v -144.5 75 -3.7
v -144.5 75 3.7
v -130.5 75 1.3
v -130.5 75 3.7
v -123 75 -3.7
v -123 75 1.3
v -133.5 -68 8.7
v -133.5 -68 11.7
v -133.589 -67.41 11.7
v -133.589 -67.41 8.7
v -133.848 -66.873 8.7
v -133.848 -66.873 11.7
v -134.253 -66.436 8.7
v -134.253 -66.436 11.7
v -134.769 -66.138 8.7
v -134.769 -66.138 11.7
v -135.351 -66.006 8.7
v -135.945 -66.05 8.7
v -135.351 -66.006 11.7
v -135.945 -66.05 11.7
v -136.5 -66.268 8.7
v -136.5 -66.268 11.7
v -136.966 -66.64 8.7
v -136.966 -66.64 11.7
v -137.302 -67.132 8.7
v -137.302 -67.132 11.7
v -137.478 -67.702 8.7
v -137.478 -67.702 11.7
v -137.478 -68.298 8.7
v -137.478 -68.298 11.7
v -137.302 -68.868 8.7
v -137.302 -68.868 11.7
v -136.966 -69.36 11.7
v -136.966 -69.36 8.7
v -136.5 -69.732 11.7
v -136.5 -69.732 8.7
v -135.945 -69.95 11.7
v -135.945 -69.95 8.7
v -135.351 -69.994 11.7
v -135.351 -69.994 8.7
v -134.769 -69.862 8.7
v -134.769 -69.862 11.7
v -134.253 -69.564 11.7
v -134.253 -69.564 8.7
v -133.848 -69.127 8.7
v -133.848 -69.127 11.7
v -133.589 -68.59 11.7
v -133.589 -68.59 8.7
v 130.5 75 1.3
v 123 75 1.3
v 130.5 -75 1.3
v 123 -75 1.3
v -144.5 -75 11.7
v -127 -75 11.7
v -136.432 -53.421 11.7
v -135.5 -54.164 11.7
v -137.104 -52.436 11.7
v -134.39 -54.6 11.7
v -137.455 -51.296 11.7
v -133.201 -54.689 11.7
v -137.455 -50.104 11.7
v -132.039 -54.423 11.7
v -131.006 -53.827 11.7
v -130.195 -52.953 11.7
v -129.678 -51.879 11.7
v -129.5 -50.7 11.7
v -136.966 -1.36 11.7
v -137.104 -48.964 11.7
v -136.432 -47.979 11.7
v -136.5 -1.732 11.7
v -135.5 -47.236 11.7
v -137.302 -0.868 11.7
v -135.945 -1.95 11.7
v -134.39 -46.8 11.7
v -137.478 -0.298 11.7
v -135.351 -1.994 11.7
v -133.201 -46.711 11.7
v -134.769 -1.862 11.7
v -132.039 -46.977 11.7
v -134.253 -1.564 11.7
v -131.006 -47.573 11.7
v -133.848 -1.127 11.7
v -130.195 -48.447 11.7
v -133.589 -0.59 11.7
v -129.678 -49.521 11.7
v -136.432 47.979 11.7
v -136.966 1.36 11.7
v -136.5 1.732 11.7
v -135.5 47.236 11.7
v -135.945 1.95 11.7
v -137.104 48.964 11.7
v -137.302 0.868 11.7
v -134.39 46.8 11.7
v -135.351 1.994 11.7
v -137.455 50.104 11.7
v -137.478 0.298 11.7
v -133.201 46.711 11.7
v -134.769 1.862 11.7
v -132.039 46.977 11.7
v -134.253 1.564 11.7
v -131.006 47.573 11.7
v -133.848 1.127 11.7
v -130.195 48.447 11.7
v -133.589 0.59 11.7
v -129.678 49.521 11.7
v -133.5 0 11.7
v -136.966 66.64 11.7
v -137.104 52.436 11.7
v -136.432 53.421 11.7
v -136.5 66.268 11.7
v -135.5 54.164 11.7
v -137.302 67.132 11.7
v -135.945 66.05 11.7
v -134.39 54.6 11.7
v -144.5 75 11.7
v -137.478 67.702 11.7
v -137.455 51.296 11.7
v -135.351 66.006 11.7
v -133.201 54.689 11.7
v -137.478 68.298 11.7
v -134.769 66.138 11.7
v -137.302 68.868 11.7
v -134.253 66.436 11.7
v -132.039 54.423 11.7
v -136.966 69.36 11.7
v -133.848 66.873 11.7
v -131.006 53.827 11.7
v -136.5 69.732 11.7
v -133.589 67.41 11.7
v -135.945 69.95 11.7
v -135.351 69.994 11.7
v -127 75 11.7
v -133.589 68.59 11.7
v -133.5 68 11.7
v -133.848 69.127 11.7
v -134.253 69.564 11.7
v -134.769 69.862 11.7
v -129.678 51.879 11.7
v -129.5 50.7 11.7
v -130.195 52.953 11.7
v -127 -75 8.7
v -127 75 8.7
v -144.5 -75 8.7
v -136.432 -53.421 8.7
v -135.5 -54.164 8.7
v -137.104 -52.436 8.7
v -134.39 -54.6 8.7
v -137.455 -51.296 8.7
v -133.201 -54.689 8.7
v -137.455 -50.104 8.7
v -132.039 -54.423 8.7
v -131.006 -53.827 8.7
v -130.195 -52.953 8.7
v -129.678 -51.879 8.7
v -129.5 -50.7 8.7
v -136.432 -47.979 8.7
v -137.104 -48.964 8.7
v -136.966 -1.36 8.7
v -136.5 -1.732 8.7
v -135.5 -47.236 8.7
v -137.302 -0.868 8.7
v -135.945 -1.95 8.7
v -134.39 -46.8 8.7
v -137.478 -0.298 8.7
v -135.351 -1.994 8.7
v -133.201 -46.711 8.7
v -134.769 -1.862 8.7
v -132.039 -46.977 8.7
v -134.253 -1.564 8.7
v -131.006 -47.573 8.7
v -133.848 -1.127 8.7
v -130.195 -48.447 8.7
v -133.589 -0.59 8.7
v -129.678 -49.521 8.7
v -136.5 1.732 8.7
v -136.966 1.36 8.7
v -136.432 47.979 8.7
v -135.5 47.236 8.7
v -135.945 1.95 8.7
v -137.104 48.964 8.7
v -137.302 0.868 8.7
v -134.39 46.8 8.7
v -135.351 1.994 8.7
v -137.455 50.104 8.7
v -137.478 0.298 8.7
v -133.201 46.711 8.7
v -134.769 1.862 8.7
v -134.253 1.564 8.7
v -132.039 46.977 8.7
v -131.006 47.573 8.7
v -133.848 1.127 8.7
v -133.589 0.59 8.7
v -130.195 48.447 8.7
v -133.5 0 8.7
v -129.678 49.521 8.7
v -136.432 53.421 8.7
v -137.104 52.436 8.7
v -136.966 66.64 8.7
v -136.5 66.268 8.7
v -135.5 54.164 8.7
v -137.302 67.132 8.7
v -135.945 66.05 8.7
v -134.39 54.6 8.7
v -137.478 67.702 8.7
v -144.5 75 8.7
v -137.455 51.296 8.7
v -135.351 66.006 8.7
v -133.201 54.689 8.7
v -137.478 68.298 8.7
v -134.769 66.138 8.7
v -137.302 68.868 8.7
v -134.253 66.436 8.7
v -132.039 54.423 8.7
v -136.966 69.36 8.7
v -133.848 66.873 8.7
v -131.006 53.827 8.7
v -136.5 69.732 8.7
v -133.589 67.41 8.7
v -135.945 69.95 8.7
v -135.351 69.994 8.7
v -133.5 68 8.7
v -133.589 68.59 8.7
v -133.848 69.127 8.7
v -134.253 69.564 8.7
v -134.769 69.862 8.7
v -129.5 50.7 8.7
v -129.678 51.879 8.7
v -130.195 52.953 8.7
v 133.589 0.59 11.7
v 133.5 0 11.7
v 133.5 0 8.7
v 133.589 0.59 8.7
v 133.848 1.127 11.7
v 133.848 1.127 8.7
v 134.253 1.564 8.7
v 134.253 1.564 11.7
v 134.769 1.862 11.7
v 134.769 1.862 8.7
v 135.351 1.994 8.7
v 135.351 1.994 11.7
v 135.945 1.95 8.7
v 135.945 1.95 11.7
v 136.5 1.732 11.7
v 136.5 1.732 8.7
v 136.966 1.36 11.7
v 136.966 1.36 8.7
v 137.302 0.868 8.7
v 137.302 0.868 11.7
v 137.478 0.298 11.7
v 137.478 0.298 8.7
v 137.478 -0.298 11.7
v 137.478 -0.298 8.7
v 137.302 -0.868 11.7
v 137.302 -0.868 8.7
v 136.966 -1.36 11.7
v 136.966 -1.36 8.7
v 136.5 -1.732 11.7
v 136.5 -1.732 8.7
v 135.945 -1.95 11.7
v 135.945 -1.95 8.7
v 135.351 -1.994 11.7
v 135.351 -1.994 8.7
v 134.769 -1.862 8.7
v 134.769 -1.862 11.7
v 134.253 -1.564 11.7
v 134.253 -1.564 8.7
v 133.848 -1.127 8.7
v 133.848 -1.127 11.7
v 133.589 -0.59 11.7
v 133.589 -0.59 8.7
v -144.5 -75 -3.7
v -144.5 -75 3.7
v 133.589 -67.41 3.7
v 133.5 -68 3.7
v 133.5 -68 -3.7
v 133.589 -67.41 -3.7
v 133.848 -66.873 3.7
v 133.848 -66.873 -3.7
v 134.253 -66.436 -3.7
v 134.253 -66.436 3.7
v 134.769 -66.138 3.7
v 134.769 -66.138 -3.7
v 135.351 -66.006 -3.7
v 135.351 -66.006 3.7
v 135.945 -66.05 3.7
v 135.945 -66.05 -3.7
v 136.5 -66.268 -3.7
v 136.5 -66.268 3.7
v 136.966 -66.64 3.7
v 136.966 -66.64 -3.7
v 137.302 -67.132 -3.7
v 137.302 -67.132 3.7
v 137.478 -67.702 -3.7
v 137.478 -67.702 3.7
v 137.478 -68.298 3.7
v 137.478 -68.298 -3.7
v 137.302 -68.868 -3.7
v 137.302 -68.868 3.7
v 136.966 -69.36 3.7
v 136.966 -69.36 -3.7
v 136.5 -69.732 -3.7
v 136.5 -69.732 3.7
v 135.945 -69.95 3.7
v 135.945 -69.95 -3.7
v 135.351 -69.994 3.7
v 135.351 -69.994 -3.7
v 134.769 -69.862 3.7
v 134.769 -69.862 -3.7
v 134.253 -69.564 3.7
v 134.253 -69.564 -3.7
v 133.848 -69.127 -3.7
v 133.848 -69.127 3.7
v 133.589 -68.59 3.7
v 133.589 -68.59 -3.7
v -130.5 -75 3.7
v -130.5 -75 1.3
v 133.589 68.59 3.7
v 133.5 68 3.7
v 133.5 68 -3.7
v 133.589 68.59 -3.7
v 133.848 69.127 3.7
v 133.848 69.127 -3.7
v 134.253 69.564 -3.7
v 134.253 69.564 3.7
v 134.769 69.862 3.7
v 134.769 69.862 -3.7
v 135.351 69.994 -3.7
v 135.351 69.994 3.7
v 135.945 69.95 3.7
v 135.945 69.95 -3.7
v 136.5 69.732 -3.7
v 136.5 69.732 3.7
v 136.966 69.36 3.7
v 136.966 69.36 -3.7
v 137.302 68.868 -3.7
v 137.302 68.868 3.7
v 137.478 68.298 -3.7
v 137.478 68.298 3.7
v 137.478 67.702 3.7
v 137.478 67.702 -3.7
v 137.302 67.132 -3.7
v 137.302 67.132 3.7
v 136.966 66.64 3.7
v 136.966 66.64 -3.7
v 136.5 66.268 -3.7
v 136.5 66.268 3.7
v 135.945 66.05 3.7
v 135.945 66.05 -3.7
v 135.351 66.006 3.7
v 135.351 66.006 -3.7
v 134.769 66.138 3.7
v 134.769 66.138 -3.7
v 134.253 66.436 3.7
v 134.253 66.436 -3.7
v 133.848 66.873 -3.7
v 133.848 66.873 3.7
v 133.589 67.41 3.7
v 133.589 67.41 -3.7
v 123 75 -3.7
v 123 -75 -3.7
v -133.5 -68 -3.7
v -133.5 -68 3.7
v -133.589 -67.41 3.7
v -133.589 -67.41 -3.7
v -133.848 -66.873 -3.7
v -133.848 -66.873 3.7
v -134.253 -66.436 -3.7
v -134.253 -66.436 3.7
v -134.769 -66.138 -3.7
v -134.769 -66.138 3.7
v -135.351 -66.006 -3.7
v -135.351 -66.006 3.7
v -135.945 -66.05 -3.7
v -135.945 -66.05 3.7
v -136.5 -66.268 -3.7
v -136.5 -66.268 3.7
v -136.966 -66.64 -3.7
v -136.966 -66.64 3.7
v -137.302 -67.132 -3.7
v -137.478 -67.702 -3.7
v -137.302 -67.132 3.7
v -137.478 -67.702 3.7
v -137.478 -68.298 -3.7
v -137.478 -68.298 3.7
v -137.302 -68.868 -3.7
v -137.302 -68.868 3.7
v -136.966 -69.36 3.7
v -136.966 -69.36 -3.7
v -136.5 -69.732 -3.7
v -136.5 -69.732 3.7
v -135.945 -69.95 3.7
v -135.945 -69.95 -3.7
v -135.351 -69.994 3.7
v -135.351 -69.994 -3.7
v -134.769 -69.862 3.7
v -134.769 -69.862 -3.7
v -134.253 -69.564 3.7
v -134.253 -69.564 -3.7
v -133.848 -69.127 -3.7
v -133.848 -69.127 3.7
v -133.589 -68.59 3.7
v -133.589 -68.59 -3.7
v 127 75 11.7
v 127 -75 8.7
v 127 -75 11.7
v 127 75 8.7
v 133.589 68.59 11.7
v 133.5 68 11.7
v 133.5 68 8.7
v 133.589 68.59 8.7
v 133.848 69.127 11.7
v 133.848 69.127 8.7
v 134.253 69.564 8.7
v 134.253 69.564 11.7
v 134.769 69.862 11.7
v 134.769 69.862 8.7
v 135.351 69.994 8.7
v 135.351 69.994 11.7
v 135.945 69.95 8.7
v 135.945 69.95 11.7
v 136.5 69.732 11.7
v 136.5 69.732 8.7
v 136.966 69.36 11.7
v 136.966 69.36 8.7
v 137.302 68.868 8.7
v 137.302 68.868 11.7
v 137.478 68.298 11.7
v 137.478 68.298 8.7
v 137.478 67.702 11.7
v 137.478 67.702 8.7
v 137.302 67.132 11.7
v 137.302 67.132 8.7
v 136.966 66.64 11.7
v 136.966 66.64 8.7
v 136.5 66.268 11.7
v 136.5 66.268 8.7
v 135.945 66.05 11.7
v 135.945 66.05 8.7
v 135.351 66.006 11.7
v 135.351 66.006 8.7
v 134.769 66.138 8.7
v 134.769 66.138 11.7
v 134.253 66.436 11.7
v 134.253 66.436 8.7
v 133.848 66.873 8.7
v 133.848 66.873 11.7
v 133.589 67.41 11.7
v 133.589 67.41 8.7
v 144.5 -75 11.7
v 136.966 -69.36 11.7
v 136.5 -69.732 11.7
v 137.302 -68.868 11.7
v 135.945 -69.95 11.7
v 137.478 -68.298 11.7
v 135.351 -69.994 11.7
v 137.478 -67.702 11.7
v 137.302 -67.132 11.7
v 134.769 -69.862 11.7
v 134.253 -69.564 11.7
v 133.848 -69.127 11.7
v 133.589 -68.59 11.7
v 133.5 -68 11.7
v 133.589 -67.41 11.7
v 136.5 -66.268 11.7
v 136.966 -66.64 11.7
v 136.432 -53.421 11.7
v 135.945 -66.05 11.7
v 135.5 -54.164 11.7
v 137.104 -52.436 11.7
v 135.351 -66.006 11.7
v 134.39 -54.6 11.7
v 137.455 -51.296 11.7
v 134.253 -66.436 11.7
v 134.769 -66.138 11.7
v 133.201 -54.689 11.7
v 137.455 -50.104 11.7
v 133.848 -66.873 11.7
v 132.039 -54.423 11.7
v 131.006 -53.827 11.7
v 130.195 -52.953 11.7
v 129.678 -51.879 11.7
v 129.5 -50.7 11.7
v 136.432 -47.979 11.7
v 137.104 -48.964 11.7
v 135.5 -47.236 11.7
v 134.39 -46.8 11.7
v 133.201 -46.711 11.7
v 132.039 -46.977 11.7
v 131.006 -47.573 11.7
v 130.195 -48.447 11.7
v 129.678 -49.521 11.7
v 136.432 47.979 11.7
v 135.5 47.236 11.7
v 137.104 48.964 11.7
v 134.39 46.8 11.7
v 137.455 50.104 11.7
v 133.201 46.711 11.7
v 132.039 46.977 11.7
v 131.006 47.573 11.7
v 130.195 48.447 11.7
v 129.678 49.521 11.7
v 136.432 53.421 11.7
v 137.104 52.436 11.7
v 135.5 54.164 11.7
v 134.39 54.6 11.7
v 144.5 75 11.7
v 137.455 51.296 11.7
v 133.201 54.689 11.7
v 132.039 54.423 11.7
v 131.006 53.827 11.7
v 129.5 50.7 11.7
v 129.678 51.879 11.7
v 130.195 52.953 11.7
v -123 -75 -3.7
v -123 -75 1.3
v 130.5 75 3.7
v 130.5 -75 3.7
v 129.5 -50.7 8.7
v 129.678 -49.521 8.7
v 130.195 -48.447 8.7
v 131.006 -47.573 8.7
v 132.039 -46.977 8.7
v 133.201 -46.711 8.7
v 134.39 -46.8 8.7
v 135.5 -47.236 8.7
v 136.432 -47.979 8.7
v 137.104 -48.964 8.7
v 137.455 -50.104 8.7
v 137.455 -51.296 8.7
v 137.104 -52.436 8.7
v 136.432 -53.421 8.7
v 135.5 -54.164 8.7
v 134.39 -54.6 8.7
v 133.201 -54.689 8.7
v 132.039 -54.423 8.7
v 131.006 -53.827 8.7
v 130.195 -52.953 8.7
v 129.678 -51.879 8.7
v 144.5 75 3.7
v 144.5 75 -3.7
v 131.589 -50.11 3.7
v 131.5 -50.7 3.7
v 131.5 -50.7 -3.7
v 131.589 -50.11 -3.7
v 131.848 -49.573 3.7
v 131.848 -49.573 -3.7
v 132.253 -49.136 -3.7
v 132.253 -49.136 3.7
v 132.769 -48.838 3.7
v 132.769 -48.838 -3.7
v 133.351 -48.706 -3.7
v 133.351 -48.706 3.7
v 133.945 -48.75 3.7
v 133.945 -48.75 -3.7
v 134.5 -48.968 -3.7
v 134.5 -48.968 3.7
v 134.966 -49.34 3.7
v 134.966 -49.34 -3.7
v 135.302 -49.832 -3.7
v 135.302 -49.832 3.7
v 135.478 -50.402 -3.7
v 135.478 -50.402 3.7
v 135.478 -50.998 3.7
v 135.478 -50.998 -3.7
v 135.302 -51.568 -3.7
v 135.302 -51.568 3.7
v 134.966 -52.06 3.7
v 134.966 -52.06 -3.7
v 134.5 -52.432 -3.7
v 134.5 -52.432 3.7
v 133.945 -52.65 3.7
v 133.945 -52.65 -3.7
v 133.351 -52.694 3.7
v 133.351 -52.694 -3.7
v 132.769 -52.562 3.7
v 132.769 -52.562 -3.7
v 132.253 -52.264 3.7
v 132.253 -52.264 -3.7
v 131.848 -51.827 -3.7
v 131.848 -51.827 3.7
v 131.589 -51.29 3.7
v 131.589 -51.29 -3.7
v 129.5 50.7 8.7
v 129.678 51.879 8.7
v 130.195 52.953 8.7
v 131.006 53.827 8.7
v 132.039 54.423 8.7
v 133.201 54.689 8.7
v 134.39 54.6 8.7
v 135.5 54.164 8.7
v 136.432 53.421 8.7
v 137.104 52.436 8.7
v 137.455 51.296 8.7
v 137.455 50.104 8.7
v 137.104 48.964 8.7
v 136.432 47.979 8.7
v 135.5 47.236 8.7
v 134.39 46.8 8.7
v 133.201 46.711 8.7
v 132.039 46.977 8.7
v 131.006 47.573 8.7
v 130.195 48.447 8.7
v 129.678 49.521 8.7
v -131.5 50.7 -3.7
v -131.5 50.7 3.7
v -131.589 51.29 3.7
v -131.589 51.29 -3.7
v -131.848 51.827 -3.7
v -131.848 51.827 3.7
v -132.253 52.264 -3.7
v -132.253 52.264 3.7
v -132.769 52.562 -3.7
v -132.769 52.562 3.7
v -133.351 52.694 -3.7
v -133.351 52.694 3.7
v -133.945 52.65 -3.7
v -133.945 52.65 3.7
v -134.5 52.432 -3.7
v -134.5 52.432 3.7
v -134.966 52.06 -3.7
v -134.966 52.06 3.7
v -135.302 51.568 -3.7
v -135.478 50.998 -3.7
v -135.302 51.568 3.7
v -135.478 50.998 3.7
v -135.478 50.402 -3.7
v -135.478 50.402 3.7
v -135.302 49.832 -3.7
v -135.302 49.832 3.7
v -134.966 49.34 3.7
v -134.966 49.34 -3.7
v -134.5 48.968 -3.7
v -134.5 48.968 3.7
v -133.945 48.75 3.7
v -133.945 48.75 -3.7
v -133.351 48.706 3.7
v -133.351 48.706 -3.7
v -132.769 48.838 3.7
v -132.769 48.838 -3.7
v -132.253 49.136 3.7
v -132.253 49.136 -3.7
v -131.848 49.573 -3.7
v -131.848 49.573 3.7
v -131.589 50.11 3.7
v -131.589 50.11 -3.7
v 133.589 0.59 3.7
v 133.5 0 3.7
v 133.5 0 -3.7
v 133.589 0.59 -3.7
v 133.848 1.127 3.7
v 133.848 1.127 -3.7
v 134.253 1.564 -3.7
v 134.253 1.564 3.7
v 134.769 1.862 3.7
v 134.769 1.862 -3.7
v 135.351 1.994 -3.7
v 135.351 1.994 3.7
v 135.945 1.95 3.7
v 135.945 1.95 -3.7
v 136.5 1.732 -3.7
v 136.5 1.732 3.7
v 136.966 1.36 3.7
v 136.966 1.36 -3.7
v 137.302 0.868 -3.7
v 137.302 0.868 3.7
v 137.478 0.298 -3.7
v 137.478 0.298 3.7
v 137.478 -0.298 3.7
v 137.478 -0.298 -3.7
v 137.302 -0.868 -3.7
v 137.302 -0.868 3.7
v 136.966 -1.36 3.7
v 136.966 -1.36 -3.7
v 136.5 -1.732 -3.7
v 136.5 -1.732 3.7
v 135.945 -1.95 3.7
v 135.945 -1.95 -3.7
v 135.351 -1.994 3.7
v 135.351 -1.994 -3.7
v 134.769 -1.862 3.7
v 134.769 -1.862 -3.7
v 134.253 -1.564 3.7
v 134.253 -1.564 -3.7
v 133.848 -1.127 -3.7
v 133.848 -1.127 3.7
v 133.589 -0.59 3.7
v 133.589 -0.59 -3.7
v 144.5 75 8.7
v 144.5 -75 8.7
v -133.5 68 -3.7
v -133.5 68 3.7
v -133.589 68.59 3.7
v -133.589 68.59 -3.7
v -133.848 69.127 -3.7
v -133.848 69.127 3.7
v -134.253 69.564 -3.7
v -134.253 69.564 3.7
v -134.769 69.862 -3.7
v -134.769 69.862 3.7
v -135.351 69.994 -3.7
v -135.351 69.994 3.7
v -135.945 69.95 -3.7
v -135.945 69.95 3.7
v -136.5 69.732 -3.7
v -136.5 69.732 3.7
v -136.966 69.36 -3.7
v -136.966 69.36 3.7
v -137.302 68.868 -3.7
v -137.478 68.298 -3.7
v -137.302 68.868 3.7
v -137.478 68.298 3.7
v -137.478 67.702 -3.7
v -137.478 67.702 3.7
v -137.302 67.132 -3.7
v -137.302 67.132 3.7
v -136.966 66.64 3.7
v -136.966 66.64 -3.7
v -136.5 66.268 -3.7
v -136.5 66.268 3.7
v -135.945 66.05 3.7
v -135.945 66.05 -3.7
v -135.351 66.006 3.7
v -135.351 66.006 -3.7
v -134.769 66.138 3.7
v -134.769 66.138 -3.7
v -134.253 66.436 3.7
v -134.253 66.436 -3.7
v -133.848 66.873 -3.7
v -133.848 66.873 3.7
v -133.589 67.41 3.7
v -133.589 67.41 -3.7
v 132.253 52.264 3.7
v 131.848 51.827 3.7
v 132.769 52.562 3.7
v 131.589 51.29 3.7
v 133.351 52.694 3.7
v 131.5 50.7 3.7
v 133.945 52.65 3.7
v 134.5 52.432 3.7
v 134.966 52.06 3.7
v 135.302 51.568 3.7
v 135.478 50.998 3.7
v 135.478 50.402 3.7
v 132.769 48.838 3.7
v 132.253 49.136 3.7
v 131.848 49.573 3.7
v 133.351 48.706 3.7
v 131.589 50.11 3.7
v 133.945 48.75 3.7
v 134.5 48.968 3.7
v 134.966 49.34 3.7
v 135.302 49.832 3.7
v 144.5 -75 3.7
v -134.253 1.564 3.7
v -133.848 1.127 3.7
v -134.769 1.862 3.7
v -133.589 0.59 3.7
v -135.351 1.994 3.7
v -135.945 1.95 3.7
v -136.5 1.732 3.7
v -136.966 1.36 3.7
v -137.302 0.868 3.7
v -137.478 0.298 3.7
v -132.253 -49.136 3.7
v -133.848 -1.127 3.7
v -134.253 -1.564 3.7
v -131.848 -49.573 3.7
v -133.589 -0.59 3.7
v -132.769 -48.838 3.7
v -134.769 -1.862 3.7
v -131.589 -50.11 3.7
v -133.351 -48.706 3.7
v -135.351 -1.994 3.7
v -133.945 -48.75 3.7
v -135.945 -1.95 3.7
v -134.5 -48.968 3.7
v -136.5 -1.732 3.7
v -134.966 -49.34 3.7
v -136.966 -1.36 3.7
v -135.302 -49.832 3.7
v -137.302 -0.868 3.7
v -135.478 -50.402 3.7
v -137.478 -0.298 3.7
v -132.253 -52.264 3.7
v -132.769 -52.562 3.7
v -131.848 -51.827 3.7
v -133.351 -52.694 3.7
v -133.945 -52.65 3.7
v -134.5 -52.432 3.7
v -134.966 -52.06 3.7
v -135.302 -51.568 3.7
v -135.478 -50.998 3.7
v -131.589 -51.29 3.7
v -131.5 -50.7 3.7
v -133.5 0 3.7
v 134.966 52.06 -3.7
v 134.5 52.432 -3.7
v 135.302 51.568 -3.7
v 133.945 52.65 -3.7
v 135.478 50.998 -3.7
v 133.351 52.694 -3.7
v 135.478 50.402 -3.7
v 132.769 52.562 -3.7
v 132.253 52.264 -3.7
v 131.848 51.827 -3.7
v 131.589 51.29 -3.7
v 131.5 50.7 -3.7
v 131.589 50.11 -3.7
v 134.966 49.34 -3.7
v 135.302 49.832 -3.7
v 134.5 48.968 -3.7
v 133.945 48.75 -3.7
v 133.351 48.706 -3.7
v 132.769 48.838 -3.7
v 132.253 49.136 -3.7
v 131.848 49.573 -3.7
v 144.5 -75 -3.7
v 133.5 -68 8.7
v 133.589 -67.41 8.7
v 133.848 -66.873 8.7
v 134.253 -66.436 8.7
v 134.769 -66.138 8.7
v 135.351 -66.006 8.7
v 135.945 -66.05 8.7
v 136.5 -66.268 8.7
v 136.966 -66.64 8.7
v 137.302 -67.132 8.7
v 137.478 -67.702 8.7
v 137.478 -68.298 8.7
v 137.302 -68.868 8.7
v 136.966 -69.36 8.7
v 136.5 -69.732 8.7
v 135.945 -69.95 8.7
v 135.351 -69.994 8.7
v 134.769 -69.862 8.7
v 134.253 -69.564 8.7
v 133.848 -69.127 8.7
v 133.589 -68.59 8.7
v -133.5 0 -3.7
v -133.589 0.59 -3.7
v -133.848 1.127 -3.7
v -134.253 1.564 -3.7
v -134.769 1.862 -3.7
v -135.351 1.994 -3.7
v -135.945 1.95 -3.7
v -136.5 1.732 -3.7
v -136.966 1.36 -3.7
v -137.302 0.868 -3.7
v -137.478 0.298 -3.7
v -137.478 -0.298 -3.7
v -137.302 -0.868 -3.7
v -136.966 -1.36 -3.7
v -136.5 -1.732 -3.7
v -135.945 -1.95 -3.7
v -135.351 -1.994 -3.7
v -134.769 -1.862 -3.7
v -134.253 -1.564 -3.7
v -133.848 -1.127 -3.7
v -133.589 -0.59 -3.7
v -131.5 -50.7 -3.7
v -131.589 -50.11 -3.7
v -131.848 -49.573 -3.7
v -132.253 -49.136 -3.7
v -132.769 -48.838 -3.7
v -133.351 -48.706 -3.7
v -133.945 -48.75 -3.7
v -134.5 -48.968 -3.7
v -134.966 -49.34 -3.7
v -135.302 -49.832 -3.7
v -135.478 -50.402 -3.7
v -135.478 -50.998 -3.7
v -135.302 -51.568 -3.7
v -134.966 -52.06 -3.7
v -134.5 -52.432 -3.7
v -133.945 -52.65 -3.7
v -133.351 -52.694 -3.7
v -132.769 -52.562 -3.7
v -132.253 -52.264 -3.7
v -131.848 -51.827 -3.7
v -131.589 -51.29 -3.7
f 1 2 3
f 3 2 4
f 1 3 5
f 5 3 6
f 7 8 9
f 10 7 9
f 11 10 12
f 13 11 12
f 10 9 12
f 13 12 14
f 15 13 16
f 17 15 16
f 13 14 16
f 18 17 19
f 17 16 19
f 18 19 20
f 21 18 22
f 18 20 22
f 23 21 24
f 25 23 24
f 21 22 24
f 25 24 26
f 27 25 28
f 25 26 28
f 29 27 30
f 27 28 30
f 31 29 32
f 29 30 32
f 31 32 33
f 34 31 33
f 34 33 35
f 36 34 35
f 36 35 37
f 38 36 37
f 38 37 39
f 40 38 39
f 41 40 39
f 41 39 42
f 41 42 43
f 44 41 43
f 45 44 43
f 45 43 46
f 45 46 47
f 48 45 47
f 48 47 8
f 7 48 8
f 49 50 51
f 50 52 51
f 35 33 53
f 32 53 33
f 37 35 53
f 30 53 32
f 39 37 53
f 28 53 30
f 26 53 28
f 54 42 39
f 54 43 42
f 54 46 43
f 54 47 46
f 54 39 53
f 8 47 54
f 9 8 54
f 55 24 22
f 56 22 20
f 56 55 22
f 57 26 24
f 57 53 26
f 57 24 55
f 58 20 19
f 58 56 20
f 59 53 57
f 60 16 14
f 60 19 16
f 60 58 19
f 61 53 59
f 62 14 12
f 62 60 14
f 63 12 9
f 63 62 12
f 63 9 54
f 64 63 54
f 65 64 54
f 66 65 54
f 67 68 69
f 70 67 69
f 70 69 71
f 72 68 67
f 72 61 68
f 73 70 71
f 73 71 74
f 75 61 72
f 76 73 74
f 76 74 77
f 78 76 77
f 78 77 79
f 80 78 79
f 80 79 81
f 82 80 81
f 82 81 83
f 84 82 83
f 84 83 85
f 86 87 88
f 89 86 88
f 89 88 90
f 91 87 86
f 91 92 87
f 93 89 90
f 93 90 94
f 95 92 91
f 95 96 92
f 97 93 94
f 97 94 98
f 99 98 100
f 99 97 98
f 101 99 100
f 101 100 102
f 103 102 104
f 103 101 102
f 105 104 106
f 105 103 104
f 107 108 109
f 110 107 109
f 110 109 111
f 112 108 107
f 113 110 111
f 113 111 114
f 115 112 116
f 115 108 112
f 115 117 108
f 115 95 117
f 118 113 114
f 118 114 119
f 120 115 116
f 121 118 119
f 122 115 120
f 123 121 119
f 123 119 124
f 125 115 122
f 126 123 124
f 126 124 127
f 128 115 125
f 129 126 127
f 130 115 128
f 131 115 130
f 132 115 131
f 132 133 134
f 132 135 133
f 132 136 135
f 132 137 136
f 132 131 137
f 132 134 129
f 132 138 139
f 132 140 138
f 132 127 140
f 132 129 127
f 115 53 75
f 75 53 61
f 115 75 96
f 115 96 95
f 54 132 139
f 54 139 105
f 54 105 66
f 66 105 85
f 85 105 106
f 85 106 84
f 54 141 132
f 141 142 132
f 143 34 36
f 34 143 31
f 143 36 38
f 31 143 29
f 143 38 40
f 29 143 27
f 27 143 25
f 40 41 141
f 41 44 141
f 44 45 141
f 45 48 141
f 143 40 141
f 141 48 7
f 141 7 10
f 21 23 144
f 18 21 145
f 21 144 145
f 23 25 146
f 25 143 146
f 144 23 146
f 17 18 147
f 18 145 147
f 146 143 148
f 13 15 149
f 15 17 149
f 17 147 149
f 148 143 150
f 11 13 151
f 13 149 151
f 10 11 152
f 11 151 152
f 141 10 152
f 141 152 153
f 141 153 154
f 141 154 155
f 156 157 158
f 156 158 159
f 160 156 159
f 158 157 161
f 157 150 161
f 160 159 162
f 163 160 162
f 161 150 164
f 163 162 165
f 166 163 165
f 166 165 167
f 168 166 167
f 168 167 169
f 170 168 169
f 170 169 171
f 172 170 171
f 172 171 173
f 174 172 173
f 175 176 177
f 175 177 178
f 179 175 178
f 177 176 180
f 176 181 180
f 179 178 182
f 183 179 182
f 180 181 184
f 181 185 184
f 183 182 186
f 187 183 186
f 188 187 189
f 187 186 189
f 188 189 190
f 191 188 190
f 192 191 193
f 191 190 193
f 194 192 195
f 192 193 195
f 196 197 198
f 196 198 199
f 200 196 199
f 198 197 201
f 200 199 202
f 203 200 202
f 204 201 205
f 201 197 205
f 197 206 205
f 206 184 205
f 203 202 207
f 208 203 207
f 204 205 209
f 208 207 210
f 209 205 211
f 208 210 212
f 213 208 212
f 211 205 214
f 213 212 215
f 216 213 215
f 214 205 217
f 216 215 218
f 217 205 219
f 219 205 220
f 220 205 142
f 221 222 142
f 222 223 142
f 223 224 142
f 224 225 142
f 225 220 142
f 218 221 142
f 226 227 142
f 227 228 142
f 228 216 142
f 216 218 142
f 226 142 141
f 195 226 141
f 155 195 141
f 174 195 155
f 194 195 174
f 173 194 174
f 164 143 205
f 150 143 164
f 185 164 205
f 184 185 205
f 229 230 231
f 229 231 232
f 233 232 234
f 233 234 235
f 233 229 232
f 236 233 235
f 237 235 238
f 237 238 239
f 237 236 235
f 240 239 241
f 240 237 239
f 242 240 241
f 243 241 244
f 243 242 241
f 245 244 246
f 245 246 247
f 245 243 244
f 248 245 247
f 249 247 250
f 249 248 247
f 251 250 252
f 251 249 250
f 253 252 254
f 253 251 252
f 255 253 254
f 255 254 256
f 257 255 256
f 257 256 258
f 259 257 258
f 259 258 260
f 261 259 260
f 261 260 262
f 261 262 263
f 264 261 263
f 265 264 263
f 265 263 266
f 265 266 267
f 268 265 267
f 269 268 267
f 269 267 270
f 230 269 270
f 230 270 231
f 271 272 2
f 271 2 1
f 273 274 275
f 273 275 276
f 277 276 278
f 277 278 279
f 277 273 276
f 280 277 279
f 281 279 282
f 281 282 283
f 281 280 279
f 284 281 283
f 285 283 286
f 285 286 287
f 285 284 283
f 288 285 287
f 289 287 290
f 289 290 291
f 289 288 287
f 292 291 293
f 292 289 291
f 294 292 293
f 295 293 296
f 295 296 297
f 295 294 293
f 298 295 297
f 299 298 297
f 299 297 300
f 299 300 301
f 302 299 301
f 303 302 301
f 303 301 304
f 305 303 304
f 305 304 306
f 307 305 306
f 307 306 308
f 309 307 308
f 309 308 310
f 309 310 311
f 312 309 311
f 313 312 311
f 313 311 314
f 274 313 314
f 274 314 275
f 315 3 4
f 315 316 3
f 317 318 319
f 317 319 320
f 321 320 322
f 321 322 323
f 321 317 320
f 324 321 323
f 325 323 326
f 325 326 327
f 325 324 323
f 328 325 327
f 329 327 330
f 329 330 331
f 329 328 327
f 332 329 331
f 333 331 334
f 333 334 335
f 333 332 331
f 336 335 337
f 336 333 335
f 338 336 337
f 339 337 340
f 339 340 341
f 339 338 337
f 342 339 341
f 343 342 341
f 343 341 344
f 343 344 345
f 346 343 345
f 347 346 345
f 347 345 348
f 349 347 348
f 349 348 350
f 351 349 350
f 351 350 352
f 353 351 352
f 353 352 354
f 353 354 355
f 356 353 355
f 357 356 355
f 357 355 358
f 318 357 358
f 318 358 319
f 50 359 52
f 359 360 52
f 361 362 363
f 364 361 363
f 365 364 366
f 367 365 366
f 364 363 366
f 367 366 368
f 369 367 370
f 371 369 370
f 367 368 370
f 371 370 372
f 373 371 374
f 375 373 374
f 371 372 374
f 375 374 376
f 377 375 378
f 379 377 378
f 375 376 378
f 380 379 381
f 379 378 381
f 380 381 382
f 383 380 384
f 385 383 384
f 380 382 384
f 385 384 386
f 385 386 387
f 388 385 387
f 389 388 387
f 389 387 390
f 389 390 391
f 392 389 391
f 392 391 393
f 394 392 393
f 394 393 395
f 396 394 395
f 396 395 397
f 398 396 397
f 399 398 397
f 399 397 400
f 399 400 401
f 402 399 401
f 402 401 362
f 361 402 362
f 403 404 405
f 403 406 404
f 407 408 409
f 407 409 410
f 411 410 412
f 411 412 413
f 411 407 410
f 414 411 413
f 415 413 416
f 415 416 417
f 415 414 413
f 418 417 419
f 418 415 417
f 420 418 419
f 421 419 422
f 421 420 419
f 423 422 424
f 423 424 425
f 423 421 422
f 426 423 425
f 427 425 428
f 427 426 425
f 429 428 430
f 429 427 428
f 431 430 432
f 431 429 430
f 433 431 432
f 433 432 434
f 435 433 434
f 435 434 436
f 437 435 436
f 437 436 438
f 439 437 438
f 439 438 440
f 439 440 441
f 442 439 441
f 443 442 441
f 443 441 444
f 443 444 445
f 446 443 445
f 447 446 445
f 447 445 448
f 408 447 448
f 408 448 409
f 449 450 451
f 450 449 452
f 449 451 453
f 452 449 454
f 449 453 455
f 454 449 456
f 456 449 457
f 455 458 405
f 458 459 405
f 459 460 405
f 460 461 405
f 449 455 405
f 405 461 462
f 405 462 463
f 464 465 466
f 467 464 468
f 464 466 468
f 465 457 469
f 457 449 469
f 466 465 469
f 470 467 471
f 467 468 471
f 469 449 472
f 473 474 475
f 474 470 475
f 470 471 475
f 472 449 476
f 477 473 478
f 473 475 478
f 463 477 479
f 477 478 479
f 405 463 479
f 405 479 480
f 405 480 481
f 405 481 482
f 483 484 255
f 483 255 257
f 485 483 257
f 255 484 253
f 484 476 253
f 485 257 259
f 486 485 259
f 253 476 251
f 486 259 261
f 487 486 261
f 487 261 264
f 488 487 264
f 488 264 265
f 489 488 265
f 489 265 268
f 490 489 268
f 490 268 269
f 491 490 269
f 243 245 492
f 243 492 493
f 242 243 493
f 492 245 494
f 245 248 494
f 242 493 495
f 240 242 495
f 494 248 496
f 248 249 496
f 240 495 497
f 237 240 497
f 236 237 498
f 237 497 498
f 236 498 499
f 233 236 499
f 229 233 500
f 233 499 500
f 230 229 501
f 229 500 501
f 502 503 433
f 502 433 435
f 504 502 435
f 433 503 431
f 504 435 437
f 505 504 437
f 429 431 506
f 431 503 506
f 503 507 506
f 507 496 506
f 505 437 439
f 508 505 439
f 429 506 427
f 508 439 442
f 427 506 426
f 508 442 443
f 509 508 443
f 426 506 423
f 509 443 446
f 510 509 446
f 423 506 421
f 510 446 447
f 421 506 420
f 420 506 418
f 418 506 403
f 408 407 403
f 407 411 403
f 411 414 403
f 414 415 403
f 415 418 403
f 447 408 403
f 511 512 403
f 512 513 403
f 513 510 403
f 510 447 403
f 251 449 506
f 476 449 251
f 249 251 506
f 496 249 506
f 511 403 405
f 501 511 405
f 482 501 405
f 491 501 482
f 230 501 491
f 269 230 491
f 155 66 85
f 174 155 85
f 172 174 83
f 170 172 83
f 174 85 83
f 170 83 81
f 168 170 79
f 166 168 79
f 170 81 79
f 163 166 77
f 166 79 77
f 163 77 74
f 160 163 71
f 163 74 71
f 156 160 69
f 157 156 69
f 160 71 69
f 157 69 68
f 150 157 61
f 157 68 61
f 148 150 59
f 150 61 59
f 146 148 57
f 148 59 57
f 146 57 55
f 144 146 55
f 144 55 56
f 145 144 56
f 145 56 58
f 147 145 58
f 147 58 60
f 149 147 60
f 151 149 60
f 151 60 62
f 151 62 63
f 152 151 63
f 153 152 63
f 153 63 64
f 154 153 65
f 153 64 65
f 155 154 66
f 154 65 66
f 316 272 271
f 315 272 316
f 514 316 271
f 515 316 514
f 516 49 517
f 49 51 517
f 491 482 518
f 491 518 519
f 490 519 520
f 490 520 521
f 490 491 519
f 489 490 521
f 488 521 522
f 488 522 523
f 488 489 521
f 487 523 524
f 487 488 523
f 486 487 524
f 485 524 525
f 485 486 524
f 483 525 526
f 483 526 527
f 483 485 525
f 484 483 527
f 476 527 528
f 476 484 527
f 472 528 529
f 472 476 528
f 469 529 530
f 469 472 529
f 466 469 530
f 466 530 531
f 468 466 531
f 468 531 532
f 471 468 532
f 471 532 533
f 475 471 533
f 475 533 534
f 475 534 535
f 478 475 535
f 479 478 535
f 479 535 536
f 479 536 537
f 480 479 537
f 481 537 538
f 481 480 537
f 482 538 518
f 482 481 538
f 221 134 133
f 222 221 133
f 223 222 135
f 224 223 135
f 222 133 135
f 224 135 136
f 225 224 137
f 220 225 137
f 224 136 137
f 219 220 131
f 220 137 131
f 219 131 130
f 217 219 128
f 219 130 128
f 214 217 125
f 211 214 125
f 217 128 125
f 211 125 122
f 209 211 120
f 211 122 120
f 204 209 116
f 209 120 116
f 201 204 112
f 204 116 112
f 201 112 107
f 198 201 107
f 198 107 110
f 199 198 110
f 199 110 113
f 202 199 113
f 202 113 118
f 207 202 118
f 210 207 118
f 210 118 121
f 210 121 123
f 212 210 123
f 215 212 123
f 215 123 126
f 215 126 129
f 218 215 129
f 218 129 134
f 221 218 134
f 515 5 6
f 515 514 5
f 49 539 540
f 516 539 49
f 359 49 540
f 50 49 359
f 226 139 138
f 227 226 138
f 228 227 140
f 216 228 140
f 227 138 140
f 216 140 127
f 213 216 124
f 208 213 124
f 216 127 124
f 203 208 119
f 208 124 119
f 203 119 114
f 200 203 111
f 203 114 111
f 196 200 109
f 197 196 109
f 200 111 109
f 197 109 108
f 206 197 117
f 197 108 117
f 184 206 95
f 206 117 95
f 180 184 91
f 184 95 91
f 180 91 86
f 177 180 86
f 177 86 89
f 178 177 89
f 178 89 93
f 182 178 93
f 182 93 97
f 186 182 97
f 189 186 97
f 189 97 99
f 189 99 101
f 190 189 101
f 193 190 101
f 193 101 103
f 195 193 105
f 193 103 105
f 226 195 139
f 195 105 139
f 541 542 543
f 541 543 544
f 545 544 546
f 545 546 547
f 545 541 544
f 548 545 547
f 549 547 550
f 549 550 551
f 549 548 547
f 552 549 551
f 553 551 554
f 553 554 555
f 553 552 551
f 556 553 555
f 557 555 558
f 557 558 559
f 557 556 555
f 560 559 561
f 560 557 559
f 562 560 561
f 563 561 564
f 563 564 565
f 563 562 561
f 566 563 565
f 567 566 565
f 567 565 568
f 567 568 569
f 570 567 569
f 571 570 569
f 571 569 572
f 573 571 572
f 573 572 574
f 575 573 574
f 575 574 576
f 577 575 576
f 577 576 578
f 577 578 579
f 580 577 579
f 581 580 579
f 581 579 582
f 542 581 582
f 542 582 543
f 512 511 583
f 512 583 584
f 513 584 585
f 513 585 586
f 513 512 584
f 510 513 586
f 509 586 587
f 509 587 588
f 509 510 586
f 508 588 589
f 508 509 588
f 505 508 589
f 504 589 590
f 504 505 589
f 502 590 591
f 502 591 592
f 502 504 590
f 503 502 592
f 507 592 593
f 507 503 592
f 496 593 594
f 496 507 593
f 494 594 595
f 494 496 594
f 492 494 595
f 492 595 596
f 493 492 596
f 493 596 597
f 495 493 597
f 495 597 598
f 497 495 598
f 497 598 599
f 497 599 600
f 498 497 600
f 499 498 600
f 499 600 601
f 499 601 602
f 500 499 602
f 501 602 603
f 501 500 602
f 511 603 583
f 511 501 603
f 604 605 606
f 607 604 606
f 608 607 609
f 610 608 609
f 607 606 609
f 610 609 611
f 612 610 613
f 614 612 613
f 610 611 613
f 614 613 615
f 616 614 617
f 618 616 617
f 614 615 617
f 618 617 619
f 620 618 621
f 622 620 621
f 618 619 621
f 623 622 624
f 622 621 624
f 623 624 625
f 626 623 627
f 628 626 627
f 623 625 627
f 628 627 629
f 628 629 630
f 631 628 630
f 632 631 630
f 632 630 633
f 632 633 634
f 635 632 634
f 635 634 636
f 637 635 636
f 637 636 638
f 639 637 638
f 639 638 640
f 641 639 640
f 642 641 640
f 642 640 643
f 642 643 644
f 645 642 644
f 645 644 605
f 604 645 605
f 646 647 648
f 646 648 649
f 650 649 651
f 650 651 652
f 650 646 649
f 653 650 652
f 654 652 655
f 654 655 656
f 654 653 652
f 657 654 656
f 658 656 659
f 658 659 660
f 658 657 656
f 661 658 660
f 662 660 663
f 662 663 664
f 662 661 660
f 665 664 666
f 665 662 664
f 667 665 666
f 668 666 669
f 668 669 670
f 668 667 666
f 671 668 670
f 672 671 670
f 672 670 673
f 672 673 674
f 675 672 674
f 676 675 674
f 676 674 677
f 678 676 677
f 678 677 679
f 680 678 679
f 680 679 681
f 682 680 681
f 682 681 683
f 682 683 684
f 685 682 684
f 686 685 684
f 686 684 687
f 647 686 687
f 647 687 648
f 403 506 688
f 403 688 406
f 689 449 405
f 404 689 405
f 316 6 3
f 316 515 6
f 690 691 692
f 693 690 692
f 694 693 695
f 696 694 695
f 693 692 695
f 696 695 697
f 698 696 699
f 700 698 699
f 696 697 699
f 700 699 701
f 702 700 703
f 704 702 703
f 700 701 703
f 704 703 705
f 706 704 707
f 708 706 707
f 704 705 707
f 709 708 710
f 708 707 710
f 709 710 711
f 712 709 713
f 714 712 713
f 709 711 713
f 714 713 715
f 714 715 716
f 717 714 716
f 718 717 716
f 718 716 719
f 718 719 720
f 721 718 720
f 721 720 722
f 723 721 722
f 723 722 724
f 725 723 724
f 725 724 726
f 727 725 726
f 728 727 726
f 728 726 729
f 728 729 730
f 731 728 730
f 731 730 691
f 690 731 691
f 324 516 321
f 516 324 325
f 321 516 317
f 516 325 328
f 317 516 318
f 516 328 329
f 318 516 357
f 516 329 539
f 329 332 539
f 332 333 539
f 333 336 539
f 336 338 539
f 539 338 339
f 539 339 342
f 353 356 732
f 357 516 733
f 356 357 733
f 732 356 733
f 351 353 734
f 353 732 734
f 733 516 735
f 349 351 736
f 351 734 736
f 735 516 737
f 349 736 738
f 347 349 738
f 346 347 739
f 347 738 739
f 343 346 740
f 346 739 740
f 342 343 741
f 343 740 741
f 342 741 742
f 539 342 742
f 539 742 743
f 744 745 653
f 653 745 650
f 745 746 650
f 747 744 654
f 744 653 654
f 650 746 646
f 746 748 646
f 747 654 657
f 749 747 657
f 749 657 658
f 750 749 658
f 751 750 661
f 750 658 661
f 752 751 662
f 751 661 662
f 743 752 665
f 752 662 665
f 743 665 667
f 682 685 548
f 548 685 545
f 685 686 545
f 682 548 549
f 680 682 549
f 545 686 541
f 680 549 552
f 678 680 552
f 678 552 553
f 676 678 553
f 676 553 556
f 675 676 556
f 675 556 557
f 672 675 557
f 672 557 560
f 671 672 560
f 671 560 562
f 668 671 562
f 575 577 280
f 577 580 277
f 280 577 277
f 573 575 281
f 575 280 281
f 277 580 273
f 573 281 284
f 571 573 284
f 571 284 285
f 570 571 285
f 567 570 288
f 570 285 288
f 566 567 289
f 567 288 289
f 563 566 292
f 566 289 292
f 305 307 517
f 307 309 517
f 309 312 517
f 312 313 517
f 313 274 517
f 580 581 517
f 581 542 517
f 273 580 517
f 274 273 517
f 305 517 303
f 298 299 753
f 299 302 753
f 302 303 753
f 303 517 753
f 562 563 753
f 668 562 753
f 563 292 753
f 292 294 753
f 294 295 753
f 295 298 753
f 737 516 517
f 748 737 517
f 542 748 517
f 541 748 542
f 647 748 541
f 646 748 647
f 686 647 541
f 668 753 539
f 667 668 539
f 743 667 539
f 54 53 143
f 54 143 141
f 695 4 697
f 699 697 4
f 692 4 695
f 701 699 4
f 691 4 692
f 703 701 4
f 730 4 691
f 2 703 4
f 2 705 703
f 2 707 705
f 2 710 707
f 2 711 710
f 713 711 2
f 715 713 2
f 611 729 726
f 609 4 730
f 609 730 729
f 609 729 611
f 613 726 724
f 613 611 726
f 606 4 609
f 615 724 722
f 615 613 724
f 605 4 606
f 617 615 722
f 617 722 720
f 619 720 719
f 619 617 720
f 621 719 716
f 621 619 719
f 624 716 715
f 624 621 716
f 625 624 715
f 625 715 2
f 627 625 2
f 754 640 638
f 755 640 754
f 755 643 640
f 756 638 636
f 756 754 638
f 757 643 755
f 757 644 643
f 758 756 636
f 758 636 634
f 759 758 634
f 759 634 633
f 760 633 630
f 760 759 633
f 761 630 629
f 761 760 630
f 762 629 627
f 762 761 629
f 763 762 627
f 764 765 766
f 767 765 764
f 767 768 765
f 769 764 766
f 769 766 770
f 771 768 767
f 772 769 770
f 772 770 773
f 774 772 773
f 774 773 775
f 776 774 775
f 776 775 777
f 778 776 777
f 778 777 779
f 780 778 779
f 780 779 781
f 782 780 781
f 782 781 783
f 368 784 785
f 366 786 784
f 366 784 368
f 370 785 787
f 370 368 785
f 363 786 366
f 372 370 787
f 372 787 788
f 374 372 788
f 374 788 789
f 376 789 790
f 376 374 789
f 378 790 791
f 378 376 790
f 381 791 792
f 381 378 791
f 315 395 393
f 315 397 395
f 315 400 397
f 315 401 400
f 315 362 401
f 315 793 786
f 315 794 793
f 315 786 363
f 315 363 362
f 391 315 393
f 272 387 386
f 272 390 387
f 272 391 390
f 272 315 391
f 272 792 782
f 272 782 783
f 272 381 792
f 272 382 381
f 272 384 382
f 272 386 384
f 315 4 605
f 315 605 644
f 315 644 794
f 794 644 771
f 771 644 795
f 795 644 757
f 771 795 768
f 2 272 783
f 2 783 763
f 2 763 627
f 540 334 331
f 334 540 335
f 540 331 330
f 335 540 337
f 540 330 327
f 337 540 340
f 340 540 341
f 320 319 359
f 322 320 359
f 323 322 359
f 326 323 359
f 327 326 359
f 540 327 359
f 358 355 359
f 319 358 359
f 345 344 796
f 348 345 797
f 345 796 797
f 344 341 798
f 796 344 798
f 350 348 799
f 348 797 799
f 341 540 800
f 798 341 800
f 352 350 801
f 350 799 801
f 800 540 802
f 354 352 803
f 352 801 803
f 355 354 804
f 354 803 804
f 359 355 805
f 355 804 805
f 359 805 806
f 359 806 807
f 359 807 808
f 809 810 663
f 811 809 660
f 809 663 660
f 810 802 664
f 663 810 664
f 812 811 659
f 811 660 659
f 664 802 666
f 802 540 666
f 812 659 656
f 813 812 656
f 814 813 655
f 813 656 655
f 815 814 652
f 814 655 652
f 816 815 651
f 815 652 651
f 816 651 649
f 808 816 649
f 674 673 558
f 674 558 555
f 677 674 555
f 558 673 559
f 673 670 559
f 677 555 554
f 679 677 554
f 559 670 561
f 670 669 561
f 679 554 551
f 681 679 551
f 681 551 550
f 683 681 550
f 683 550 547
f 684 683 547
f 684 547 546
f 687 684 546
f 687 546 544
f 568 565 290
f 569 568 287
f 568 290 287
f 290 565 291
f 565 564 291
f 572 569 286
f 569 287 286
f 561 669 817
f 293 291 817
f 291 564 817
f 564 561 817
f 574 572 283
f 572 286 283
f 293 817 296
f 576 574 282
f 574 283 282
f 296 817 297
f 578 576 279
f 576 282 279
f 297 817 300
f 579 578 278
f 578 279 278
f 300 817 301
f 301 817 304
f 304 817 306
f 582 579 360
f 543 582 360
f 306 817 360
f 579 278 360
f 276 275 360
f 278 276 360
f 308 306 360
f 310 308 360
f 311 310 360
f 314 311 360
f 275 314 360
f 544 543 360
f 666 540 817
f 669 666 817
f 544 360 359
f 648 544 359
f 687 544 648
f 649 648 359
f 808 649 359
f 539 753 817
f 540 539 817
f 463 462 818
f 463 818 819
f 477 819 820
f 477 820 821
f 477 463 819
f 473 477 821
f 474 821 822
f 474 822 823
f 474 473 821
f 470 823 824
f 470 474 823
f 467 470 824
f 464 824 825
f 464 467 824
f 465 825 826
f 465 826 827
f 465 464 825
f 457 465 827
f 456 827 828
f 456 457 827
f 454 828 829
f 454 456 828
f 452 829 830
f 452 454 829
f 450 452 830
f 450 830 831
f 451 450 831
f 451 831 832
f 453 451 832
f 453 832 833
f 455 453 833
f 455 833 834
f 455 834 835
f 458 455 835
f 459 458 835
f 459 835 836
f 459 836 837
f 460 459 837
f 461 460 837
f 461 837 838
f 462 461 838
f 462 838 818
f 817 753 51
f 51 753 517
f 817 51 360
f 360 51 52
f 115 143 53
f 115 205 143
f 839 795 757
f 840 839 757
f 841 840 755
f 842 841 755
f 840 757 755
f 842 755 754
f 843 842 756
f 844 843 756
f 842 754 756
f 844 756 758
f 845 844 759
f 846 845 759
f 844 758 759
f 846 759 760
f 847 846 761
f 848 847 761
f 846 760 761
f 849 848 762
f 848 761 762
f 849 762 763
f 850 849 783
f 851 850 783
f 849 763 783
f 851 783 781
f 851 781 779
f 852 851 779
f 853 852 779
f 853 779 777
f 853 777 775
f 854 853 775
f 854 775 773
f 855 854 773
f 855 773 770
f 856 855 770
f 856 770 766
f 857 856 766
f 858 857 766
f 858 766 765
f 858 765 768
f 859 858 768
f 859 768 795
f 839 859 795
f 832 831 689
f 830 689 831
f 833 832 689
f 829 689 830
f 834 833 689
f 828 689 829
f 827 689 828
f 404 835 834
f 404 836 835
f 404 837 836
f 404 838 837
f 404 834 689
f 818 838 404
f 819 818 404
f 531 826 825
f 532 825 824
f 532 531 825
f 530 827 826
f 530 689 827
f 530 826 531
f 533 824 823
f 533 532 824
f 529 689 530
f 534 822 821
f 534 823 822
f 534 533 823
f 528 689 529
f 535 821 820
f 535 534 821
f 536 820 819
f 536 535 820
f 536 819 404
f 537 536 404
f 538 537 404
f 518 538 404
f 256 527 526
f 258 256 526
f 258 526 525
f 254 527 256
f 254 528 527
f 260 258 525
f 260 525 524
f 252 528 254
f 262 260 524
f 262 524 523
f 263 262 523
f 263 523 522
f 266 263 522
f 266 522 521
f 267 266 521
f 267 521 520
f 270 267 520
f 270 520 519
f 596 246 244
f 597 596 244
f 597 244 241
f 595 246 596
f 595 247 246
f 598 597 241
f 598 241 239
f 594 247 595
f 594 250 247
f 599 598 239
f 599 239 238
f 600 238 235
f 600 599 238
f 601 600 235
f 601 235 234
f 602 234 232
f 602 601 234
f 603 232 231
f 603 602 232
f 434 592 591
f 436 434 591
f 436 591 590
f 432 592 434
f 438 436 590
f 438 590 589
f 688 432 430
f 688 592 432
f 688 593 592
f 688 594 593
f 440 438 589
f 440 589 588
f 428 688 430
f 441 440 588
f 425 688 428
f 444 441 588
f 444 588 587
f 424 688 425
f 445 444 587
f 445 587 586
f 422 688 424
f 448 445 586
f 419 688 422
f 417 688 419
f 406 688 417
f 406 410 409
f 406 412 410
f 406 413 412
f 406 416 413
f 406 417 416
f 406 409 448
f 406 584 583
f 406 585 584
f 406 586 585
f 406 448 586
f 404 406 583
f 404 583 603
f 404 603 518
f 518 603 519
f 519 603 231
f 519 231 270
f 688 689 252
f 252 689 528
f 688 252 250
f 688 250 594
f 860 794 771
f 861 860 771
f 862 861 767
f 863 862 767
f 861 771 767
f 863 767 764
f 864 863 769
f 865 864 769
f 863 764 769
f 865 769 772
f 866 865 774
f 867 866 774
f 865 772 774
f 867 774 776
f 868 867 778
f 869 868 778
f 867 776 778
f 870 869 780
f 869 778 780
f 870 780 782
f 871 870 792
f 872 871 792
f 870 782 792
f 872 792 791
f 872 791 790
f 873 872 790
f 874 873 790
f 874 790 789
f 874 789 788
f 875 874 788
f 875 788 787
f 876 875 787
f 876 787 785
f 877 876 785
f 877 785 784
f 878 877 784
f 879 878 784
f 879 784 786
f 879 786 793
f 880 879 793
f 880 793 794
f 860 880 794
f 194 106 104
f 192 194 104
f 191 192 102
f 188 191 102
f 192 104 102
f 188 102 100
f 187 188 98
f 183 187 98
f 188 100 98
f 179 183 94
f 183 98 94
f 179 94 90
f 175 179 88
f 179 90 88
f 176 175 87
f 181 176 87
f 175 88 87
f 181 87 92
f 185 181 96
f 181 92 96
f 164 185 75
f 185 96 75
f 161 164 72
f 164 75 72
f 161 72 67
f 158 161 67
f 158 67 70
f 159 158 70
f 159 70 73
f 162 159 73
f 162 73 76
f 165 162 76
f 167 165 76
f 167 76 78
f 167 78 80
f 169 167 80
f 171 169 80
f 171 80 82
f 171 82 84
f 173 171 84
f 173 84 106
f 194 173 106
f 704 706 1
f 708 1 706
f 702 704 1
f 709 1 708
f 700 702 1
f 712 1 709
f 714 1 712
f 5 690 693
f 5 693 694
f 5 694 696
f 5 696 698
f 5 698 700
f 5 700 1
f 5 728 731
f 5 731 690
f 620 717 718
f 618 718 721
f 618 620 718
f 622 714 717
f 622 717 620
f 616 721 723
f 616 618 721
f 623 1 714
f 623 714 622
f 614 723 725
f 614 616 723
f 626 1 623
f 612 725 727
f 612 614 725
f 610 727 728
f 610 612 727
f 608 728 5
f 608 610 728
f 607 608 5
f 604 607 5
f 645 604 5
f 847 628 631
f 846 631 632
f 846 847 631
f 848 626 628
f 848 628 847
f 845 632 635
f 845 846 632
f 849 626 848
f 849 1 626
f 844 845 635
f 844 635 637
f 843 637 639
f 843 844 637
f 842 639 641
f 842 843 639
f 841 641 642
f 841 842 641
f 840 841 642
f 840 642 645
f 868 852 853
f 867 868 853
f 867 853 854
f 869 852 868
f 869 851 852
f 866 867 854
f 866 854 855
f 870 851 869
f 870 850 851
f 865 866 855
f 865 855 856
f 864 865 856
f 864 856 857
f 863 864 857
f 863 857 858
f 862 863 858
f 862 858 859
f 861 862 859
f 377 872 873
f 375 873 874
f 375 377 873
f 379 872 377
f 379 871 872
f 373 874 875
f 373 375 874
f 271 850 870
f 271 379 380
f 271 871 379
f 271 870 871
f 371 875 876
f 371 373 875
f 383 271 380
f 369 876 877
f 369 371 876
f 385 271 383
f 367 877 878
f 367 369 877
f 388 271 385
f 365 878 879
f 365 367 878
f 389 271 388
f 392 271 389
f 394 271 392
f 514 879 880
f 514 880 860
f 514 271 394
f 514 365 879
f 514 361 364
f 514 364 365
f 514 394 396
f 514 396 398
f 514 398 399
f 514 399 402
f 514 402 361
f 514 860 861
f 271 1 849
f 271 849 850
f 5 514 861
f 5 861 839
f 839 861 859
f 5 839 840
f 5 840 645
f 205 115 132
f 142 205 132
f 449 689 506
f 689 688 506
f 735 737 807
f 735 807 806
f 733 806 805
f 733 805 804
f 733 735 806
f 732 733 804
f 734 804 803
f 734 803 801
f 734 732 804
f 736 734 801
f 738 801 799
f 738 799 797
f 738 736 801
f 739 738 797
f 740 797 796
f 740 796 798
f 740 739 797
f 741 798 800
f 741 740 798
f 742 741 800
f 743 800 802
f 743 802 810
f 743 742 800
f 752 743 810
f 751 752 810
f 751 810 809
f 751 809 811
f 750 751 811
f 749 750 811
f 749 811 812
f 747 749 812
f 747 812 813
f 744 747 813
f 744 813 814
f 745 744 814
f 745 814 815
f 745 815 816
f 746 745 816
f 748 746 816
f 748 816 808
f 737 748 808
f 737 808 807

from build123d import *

# Parameters (mm, degrees)
F0_W     = 17.5
F0_H     = 3
F1_DEPTH = 75
F2_R     = 2
F3_DEPTH = 15.401
F2_R_2   = 4
F4_DEPTH = 3


with BuildPart() as f1:
    # F0 (on Front) → F1 (new body, symmetric)
    with BuildSketch(Plane.XZ):
        with Locations((-135.75, 10.2)):
            Rectangle(F0_W, F0_H)
        Polygon((-130.5, 1.3), (-130.5, 3.7), (-144.5, 3.7), (-144.5, -3.7), (-123, -3.7), (-123, 1.3), align=None)
    extrude(amount=F1_DEPTH, both=True)

    # F2 (on face) → F3 (cut, through all)
    with BuildSketch(Plane.XY.offset(11.7)):
        with Locations((-135.5, 68)):
            Circle(F2_R)
        with Locations((-133.5, 50.7)):
            Circle(F2_R)
        with Locations((-135.5, 0)):
            Circle(F2_R)
        with Locations((-133.5, -50.7)):
            Circle(F2_R)
        with Locations((-135.5, -68)):
            Circle(F2_R)
    extrude(amount=-F3_DEPTH, mode=Mode.SUBTRACT)

    # F2 (on face) → F4 (cut, through all)
    with BuildSketch(Plane.XY.offset(11.7)):
        with Locations((-133.5, 50.7)):
            Circle(F2_R_2)
        with Locations((-133.5, 50.7)):
            Circle(F2_R, mode=Mode.SUBTRACT)
        with Locations((-133.5, -50.7)):
            Circle(F2_R_2)
        with Locations((-133.5, -50.7)):
            Circle(F2_R, mode=Mode.SUBTRACT)
    extrude(amount=-F4_DEPTH, mode=Mode.SUBTRACT)


with BuildPart() as f5_1:
    # F5: instance of F1
    add(f1.part.mirror(Plane.YZ))


solid = Compound([f1.part, f5_1.part])
